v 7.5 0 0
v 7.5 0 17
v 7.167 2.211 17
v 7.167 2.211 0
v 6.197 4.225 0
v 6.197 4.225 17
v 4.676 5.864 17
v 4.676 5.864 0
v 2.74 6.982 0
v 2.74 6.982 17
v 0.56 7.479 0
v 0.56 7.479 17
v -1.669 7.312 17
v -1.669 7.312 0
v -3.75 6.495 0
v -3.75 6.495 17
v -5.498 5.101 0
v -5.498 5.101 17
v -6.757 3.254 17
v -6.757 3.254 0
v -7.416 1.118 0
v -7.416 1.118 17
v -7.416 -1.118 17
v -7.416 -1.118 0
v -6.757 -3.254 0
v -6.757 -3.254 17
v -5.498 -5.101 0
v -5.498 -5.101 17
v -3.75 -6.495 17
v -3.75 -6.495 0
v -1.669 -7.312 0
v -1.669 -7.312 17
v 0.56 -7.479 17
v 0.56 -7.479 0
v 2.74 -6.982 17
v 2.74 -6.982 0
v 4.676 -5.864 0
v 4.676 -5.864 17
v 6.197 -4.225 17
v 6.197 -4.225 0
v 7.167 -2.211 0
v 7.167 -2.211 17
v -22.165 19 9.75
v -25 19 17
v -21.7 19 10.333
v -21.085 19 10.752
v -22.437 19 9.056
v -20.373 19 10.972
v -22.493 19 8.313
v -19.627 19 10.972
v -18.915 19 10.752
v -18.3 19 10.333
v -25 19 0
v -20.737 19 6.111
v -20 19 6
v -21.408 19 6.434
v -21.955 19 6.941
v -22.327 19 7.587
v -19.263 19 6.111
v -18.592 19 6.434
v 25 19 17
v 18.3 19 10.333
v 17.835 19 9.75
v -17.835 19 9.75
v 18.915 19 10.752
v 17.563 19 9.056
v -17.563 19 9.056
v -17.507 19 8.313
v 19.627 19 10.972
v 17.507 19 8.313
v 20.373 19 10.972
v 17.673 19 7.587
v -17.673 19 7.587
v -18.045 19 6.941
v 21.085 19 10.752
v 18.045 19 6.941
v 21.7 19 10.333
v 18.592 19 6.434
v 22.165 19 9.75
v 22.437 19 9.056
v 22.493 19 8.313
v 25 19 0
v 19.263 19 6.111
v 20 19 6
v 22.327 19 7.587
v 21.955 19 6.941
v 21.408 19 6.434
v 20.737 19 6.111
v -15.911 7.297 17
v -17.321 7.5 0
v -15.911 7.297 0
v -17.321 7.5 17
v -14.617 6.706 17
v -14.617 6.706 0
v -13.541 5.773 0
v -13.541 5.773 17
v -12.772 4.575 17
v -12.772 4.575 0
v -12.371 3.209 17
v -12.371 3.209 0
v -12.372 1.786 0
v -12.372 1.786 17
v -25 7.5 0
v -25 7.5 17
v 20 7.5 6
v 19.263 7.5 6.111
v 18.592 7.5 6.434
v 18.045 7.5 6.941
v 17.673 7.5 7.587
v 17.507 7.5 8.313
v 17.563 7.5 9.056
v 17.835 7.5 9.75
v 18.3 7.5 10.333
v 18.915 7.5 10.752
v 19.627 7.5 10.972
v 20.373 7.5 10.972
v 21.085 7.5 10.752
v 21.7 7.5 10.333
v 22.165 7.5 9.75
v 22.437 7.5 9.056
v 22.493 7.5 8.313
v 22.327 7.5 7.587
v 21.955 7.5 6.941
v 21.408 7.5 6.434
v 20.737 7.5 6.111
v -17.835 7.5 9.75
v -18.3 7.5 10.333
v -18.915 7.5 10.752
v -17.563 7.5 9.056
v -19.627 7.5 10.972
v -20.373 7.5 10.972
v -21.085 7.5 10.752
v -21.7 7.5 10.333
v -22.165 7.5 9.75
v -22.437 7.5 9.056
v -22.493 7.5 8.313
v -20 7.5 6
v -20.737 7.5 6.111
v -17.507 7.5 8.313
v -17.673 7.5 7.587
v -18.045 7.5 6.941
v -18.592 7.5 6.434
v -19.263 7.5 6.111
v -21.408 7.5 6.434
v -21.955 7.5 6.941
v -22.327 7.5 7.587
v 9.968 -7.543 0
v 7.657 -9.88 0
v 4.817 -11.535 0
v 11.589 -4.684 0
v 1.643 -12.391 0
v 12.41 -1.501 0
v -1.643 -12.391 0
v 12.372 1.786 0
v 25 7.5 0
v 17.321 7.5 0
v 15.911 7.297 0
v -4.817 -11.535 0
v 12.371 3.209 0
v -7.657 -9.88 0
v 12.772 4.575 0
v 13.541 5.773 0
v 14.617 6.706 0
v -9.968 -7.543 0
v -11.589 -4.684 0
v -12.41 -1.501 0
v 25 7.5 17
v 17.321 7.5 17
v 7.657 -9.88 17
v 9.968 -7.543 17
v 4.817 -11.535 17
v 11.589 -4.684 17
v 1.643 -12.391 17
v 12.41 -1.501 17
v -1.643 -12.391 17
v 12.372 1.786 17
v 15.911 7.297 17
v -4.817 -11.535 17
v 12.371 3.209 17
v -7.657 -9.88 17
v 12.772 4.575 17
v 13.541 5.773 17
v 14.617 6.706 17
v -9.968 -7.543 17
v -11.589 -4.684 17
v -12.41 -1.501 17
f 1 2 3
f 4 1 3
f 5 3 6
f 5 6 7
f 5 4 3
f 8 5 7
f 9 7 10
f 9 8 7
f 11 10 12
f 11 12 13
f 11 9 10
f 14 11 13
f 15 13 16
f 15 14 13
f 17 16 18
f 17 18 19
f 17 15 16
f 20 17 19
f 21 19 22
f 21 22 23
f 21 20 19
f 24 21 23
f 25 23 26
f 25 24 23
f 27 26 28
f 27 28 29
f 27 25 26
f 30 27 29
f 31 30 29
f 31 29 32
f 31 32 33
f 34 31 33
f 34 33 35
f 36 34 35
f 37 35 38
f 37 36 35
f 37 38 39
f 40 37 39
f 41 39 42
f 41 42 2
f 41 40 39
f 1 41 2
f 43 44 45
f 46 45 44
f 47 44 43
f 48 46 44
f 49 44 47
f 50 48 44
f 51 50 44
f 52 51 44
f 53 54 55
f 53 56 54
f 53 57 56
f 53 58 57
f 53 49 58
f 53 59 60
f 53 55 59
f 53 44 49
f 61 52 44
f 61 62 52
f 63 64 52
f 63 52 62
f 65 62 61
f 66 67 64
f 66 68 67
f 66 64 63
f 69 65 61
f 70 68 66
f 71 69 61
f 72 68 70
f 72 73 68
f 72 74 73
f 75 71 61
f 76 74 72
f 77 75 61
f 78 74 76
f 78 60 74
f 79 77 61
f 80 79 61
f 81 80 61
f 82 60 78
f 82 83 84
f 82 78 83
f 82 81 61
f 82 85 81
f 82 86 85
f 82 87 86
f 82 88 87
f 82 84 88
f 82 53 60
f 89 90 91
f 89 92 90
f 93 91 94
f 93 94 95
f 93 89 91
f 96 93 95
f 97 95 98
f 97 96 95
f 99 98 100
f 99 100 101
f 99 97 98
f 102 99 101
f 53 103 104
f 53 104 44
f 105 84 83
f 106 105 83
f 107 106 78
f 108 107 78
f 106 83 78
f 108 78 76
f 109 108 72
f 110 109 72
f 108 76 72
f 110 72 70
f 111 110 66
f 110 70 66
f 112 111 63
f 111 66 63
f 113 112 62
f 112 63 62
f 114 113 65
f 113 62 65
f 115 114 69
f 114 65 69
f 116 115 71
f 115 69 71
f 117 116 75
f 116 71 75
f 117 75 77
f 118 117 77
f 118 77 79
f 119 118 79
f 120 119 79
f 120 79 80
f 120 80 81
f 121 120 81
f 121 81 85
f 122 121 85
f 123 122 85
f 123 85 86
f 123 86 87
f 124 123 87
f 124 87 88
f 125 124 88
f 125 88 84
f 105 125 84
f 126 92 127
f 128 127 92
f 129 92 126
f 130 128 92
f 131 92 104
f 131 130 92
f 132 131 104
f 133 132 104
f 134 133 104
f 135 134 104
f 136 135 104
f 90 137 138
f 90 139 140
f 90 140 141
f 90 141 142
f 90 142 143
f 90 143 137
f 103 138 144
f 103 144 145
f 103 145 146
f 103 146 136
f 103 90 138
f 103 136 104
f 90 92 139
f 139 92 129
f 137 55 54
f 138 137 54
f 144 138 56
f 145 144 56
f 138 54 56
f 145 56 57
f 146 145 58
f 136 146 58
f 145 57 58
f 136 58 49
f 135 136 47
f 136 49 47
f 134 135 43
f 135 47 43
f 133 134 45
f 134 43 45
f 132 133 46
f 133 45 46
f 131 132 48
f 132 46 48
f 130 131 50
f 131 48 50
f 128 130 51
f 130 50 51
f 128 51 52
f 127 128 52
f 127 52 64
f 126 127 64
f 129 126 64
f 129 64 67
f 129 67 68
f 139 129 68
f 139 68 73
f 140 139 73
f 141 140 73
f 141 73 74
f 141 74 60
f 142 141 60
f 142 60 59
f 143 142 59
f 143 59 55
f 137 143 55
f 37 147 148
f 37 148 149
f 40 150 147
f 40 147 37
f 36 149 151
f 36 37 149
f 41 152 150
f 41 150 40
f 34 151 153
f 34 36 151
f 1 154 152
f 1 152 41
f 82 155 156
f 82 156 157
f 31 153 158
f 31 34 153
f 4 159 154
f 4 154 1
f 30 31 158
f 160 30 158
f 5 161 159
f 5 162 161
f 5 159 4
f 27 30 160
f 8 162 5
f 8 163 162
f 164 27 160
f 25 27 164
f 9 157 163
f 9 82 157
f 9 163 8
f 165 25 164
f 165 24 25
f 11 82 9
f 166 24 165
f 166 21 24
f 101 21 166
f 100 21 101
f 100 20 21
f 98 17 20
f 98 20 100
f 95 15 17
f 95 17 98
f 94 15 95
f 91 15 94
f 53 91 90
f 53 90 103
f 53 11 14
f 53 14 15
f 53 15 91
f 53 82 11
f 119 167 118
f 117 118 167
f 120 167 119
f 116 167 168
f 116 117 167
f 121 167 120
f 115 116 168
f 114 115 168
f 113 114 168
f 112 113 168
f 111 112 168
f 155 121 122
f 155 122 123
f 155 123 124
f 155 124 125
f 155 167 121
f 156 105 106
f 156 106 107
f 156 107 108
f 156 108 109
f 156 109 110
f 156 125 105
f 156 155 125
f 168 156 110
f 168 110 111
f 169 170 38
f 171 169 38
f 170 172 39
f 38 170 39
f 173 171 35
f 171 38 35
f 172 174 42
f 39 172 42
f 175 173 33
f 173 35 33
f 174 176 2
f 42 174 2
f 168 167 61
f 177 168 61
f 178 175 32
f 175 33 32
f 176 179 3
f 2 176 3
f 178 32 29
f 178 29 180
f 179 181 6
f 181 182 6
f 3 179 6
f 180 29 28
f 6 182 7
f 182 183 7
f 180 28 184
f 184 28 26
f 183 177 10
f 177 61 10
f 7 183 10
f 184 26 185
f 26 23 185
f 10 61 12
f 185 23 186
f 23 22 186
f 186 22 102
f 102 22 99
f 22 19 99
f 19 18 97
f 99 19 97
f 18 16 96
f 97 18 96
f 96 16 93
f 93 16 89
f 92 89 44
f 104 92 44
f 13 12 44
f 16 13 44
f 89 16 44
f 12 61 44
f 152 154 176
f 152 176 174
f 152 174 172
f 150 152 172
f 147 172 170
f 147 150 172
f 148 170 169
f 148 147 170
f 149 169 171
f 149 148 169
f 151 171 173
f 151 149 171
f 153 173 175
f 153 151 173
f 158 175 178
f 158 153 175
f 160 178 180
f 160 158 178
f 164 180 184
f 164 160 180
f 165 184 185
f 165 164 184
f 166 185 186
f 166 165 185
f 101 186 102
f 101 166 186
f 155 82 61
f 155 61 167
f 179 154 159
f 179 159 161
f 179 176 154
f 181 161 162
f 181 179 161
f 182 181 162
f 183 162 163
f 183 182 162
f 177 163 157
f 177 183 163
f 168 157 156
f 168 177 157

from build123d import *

# Parameters (mm, degrees)
SKETCH1_R                      = 7.5
BOSS_EXTRUDE1_DEPTH            = 17
CUT_EXTRUDE1_REACH             = 45.661
SKETCH2_R                      = 2.5
CUT_EXTRUDE1_DIRECTION_2_DEPTH = 44.660622991
FILLET1_R                      = 5
FILLET2_R                      = 5


with BuildPart() as part:
    # Sketch1 → Boss-Extrude1 (new body)
    with BuildSketch(Plane.XY):
        with BuildLine():
            Line((-25, 19), (25, 19))
            Line((25, 19), (25, 7.5))
            Line((25, 7.5), (10, 7.5))
            ThreePointArc((10, 7.5), (0, -12.5), (-10, 7.5))
            Line((-10, 7.5), (-25, 7.5))
            Line((-25, 7.5), (-25, 19))
        make_face()
        Circle(SKETCH1_R, mode=Mode.SUBTRACT)
    extrude(amount=BOSS_EXTRUDE1_DEPTH)

    # Sketch2 → Cut-Extrude1 (cut, up to next)
    with BuildSketch(Plane(origin=(0, 19, 0), x_dir=(1, 0, 0), z_dir=(0, 1, 0)), mode=Mode.PRIVATE) as cut_extrude1_sk1:
        with Locations(Location((20, -8.5, 0), (0, 0, 90))):
            Circle(SKETCH2_R)
    cut_extrude1_tool1 = extrude(cut_extrude1_sk1.sketch, amount=-CUT_EXTRUDE1_REACH, mode=Mode.PRIVATE) & part.part
    # Sketch2 → Cut-Extrude1 (cut, up to next)
    with BuildSketch(Plane(origin=(0, 19, 0), x_dir=(1, 0, 0), z_dir=(0, 1, 0)), mode=Mode.PRIVATE) as cut_extrude1_sk2:
        with Locations(Location((-20, -8.5, 0), (0, 0, 90))):
            Circle(SKETCH2_R)
    cut_extrude1_tool2 = extrude(cut_extrude1_sk2.sketch, amount=-CUT_EXTRUDE1_REACH, mode=Mode.PRIVATE) & part.part
    add(cut_extrude1_tool1.solids().sort_by_distance((20, 19, 8.5))[0], mode=Mode.SUBTRACT)
    add(cut_extrude1_tool2.solids().sort_by_distance((-20, 19, 8.5))[0], mode=Mode.SUBTRACT)

    # Sketch2 → Cut-Extrude1 direction 2 (cut)
    with BuildSketch(Plane(origin=(0, 19, 0), x_dir=(1, 0, 0), z_dir=(0, 1, 0))):
        with Locations(Location((20, -8.5, 0), (0, 0, 90))):
            Circle(SKETCH2_R)
        with Locations(Location((-20, -8.5, 0), (0, 0, 90))):
            Circle(SKETCH2_R)
    extrude(amount=CUT_EXTRUDE1_DIRECTION_2_DEPTH, mode=Mode.SUBTRACT)

    # Fillet1
    fillet1_edges = [part.edges().sort_by_distance(p)[0] for p in [
        (-10, 7.5, 8.5),
    ]]
    fillet(fillet1_edges, radius=FILLET1_R)

    # Fillet2
    fillet2_edges = [part.edges().sort_by_distance(p)[0] for p in [
        (10, 7.5, 8.5),
    ]]
    fillet(fillet2_edges, radius=FILLET2_R)


solid = part.part
